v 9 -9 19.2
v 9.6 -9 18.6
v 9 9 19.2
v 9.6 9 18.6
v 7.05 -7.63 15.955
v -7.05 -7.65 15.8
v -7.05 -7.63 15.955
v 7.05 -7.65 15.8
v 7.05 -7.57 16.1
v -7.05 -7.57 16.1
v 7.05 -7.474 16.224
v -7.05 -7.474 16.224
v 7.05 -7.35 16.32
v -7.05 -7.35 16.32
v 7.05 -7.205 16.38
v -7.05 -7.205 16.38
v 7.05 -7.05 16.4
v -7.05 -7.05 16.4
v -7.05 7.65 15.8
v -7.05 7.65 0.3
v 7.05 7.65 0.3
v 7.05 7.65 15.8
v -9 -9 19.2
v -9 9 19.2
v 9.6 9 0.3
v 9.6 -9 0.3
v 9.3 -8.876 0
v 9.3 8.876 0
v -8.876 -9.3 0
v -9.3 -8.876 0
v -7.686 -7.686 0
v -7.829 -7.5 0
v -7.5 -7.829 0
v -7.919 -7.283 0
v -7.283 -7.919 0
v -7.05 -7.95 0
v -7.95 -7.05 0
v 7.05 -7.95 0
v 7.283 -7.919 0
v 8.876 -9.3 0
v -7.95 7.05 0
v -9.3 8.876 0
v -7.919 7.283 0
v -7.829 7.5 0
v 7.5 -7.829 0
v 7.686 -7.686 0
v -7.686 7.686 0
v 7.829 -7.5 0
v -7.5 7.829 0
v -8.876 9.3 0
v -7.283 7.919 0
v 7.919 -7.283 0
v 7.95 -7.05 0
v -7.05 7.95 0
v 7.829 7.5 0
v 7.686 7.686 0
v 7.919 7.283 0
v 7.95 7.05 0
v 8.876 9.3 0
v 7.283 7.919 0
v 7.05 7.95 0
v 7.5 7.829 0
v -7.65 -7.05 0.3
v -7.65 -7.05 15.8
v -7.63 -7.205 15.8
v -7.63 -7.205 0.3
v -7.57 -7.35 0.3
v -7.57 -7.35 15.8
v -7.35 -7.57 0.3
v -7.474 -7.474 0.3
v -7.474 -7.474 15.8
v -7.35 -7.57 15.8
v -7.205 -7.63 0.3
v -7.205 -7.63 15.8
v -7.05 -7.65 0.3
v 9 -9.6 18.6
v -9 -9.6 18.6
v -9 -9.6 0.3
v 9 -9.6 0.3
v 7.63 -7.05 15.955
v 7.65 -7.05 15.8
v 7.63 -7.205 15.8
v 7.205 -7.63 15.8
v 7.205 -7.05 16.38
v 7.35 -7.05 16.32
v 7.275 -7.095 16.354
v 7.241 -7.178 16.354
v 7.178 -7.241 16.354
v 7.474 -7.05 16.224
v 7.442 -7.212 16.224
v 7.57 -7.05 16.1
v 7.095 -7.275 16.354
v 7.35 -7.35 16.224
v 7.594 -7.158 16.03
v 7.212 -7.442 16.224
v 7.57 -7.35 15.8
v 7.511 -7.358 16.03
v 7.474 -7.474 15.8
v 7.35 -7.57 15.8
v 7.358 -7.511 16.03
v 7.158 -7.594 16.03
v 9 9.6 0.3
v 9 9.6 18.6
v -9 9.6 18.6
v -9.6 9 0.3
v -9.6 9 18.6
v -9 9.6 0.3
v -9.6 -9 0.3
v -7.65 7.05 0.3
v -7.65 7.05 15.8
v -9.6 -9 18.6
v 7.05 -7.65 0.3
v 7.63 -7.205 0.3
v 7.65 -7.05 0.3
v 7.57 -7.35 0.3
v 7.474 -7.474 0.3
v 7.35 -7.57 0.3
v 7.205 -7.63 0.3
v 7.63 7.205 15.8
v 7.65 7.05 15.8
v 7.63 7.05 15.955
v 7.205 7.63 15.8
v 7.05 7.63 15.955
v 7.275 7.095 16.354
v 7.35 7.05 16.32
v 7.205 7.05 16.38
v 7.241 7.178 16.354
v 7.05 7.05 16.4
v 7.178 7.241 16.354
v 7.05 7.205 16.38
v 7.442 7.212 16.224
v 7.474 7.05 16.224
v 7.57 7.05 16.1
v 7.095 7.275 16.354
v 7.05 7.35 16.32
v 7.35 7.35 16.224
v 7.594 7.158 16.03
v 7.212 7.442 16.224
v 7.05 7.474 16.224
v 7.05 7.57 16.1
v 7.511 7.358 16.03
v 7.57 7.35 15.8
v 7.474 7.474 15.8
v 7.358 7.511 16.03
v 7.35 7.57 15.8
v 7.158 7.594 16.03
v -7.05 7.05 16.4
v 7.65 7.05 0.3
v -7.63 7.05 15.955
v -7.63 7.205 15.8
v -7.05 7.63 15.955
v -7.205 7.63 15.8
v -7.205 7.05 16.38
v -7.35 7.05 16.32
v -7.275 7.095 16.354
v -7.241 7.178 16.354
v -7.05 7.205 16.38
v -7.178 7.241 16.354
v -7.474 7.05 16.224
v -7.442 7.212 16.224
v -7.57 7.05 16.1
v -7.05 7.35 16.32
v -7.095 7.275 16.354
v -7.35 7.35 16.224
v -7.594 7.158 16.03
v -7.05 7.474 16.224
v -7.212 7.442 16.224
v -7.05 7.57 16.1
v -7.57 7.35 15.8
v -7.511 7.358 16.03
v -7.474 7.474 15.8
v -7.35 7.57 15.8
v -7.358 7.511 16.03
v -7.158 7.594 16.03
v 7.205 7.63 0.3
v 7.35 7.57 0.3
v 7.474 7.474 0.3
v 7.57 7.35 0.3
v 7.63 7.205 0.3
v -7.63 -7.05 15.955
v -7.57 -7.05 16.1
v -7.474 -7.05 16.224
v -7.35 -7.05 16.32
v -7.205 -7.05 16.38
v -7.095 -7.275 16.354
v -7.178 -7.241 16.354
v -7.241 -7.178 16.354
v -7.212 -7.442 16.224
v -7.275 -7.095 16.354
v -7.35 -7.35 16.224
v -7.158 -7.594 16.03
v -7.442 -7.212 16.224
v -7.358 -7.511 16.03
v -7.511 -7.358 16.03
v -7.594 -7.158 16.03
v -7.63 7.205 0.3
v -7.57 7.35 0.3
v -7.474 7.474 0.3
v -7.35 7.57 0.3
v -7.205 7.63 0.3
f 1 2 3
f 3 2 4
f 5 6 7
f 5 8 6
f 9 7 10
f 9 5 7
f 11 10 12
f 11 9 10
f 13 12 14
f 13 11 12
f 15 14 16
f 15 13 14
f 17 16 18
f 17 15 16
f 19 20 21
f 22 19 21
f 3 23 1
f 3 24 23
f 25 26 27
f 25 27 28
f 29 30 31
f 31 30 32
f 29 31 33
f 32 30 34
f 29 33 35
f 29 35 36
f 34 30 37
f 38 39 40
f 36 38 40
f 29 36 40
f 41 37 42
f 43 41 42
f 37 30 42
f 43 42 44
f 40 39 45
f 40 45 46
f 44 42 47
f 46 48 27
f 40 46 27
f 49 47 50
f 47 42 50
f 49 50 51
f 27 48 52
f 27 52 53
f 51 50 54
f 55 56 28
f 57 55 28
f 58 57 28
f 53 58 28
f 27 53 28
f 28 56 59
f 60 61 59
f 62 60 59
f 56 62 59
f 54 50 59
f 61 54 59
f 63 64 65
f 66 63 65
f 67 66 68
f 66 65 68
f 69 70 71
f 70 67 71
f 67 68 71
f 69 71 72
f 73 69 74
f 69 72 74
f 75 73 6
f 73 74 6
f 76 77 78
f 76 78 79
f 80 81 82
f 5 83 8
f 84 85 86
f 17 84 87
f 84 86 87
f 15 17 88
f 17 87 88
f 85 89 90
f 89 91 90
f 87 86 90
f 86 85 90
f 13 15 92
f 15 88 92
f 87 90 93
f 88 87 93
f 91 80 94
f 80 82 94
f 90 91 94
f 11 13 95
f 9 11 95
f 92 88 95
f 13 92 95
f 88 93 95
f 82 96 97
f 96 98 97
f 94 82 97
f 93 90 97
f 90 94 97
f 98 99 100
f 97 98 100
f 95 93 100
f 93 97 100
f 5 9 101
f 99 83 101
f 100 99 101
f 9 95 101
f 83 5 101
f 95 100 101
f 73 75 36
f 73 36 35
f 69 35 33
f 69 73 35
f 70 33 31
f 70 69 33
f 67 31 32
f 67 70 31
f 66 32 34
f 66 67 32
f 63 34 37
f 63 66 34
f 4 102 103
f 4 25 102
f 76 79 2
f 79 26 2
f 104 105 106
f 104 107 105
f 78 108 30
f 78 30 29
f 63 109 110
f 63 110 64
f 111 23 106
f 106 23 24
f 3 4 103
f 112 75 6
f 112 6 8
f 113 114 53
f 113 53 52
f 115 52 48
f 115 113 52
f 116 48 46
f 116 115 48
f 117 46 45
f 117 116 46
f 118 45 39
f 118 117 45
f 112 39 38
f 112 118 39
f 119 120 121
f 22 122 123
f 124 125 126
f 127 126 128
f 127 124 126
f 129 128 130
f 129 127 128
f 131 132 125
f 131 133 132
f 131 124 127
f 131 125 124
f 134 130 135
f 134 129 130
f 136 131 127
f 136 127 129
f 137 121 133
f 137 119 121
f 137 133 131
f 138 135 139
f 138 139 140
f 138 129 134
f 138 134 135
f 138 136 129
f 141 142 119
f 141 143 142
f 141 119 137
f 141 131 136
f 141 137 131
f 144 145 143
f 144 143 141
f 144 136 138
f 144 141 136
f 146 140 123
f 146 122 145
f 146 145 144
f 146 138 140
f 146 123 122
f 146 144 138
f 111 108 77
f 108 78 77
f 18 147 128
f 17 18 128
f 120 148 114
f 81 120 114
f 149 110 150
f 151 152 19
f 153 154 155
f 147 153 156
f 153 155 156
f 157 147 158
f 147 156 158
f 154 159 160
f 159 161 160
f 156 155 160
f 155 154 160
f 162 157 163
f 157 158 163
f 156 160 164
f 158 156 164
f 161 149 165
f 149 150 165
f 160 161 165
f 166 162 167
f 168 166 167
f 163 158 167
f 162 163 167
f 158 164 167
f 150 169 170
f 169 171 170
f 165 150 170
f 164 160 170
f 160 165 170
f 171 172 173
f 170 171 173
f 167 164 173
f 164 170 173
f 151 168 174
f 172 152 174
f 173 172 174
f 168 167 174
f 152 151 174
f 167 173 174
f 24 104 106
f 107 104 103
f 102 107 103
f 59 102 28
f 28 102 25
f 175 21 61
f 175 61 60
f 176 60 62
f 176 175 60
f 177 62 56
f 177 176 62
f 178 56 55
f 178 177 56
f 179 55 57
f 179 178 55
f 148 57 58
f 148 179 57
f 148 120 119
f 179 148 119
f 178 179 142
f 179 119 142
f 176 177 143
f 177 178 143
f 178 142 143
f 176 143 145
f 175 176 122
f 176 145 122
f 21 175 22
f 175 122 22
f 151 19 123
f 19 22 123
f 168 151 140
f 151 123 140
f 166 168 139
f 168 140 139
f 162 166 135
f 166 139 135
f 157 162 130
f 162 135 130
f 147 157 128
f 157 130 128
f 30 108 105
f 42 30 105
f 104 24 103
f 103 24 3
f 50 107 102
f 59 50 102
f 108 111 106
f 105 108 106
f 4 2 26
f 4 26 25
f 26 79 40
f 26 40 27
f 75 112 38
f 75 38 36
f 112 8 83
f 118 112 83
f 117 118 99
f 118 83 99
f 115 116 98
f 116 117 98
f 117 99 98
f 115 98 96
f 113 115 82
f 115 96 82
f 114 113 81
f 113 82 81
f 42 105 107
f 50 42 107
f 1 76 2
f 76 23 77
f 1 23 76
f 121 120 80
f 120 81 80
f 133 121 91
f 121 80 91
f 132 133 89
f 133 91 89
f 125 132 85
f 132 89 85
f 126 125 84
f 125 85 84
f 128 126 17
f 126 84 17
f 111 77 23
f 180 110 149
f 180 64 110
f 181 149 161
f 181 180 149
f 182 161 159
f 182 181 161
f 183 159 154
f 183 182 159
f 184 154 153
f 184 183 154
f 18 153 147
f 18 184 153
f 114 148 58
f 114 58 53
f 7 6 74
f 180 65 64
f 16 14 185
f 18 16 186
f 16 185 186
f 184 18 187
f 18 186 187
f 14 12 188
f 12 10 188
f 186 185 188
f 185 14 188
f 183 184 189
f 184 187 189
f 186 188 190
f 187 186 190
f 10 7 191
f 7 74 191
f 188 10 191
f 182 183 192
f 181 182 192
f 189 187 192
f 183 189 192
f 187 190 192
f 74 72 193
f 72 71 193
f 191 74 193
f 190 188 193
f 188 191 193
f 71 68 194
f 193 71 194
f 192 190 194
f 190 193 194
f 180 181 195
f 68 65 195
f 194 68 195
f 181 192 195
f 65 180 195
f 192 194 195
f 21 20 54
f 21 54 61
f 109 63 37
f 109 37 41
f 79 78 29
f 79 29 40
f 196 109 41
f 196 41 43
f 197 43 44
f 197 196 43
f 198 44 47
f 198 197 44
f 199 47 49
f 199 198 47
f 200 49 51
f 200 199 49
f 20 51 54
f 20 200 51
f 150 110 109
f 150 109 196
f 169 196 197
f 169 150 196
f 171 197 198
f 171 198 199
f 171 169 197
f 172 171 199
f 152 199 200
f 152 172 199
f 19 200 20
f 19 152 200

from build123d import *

# Parameters (mm, degrees)
F0_W     = 19.2
F0_H     = 19.2
F1_DEPTH = 19.2
F2_W     = 15.3
F2_H     = 15.3
F3_DEPTH = 16.4
F4_SIZE  = 0.6
F5_R     = 0.6
F6_SIZE  = 0.3


with BuildPart() as f1:
    # F0 (on Top) → F1 (new body)
    with BuildSketch(Plane.XY):
        Rectangle(F0_W, F0_H)
    extrude(amount=F1_DEPTH)

    # F2 (on face) → F3 (cut)
    with BuildSketch(Plane(origin=(0, 0, 0), x_dir=(1, 0, 0), z_dir=(0, 0, -1))):
        Rectangle(F2_W, F2_H)
    extrude(amount=-F3_DEPTH, mode=Mode.SUBTRACT)

    # F4
    f4_edges = [f1.edges().sort_by_distance(p)[0] for p in [
        (-9.6, -9.6, 9.6),
        (-9.6, 9.6, 9.6),
        (9.6, 9.6, 9.6),
        (9.6, -9.6, 9.6),
        (0, -9.6, 19.2),
        (9.6, 0, 19.2),
        (0, 9.6, 19.2),
        (-9.6, 0, 19.2),
    ]]
    chamfer(f4_edges, length=F4_SIZE)

    # F5
    f5_edges = [f1.edges().sort_by_distance(p)[0] for p in [
        (-7.65, 7.65, 8.2),
        (-7.65, -7.65, 8.2),
        (7.65, -7.65, 8.2),
        (7.65, 7.65, 8.2),
        (7.65, 0, 16.4),
        (0, -7.65, 16.4),
        (-7.65, 0, 16.4),
        (0, 7.65, 16.4),
    ]]
    fillet(f5_edges, radius=F5_R)

    # F6
    f6_edges = [f1.edges().sort_by_distance(p)[0] for p in [
        (0, 7.65, 0),
        (-7.474264, 7.474264, 0),
        (7.474264, 7.474264, 0),
        (-7.65, 0, 0),
        (7.65, 0, 0),
        (-7.474264, -7.474264, 0),
        (7.474264, -7.474264, 0),
        (0, -7.65, 0),
        (0, -9.6, 0),
        (-9.3, -9.3, 0),
        (9.3, -9.3, 0),
        (-9.6, 0, 0),
        (9.6, 0, 0),
        (-9.3, 9.3, 0),
        (9.3, 9.3, 0),
        (0, 9.6, 0),
    ]]
    chamfer(f6_edges, length=F6_SIZE)


solid = f1.part
